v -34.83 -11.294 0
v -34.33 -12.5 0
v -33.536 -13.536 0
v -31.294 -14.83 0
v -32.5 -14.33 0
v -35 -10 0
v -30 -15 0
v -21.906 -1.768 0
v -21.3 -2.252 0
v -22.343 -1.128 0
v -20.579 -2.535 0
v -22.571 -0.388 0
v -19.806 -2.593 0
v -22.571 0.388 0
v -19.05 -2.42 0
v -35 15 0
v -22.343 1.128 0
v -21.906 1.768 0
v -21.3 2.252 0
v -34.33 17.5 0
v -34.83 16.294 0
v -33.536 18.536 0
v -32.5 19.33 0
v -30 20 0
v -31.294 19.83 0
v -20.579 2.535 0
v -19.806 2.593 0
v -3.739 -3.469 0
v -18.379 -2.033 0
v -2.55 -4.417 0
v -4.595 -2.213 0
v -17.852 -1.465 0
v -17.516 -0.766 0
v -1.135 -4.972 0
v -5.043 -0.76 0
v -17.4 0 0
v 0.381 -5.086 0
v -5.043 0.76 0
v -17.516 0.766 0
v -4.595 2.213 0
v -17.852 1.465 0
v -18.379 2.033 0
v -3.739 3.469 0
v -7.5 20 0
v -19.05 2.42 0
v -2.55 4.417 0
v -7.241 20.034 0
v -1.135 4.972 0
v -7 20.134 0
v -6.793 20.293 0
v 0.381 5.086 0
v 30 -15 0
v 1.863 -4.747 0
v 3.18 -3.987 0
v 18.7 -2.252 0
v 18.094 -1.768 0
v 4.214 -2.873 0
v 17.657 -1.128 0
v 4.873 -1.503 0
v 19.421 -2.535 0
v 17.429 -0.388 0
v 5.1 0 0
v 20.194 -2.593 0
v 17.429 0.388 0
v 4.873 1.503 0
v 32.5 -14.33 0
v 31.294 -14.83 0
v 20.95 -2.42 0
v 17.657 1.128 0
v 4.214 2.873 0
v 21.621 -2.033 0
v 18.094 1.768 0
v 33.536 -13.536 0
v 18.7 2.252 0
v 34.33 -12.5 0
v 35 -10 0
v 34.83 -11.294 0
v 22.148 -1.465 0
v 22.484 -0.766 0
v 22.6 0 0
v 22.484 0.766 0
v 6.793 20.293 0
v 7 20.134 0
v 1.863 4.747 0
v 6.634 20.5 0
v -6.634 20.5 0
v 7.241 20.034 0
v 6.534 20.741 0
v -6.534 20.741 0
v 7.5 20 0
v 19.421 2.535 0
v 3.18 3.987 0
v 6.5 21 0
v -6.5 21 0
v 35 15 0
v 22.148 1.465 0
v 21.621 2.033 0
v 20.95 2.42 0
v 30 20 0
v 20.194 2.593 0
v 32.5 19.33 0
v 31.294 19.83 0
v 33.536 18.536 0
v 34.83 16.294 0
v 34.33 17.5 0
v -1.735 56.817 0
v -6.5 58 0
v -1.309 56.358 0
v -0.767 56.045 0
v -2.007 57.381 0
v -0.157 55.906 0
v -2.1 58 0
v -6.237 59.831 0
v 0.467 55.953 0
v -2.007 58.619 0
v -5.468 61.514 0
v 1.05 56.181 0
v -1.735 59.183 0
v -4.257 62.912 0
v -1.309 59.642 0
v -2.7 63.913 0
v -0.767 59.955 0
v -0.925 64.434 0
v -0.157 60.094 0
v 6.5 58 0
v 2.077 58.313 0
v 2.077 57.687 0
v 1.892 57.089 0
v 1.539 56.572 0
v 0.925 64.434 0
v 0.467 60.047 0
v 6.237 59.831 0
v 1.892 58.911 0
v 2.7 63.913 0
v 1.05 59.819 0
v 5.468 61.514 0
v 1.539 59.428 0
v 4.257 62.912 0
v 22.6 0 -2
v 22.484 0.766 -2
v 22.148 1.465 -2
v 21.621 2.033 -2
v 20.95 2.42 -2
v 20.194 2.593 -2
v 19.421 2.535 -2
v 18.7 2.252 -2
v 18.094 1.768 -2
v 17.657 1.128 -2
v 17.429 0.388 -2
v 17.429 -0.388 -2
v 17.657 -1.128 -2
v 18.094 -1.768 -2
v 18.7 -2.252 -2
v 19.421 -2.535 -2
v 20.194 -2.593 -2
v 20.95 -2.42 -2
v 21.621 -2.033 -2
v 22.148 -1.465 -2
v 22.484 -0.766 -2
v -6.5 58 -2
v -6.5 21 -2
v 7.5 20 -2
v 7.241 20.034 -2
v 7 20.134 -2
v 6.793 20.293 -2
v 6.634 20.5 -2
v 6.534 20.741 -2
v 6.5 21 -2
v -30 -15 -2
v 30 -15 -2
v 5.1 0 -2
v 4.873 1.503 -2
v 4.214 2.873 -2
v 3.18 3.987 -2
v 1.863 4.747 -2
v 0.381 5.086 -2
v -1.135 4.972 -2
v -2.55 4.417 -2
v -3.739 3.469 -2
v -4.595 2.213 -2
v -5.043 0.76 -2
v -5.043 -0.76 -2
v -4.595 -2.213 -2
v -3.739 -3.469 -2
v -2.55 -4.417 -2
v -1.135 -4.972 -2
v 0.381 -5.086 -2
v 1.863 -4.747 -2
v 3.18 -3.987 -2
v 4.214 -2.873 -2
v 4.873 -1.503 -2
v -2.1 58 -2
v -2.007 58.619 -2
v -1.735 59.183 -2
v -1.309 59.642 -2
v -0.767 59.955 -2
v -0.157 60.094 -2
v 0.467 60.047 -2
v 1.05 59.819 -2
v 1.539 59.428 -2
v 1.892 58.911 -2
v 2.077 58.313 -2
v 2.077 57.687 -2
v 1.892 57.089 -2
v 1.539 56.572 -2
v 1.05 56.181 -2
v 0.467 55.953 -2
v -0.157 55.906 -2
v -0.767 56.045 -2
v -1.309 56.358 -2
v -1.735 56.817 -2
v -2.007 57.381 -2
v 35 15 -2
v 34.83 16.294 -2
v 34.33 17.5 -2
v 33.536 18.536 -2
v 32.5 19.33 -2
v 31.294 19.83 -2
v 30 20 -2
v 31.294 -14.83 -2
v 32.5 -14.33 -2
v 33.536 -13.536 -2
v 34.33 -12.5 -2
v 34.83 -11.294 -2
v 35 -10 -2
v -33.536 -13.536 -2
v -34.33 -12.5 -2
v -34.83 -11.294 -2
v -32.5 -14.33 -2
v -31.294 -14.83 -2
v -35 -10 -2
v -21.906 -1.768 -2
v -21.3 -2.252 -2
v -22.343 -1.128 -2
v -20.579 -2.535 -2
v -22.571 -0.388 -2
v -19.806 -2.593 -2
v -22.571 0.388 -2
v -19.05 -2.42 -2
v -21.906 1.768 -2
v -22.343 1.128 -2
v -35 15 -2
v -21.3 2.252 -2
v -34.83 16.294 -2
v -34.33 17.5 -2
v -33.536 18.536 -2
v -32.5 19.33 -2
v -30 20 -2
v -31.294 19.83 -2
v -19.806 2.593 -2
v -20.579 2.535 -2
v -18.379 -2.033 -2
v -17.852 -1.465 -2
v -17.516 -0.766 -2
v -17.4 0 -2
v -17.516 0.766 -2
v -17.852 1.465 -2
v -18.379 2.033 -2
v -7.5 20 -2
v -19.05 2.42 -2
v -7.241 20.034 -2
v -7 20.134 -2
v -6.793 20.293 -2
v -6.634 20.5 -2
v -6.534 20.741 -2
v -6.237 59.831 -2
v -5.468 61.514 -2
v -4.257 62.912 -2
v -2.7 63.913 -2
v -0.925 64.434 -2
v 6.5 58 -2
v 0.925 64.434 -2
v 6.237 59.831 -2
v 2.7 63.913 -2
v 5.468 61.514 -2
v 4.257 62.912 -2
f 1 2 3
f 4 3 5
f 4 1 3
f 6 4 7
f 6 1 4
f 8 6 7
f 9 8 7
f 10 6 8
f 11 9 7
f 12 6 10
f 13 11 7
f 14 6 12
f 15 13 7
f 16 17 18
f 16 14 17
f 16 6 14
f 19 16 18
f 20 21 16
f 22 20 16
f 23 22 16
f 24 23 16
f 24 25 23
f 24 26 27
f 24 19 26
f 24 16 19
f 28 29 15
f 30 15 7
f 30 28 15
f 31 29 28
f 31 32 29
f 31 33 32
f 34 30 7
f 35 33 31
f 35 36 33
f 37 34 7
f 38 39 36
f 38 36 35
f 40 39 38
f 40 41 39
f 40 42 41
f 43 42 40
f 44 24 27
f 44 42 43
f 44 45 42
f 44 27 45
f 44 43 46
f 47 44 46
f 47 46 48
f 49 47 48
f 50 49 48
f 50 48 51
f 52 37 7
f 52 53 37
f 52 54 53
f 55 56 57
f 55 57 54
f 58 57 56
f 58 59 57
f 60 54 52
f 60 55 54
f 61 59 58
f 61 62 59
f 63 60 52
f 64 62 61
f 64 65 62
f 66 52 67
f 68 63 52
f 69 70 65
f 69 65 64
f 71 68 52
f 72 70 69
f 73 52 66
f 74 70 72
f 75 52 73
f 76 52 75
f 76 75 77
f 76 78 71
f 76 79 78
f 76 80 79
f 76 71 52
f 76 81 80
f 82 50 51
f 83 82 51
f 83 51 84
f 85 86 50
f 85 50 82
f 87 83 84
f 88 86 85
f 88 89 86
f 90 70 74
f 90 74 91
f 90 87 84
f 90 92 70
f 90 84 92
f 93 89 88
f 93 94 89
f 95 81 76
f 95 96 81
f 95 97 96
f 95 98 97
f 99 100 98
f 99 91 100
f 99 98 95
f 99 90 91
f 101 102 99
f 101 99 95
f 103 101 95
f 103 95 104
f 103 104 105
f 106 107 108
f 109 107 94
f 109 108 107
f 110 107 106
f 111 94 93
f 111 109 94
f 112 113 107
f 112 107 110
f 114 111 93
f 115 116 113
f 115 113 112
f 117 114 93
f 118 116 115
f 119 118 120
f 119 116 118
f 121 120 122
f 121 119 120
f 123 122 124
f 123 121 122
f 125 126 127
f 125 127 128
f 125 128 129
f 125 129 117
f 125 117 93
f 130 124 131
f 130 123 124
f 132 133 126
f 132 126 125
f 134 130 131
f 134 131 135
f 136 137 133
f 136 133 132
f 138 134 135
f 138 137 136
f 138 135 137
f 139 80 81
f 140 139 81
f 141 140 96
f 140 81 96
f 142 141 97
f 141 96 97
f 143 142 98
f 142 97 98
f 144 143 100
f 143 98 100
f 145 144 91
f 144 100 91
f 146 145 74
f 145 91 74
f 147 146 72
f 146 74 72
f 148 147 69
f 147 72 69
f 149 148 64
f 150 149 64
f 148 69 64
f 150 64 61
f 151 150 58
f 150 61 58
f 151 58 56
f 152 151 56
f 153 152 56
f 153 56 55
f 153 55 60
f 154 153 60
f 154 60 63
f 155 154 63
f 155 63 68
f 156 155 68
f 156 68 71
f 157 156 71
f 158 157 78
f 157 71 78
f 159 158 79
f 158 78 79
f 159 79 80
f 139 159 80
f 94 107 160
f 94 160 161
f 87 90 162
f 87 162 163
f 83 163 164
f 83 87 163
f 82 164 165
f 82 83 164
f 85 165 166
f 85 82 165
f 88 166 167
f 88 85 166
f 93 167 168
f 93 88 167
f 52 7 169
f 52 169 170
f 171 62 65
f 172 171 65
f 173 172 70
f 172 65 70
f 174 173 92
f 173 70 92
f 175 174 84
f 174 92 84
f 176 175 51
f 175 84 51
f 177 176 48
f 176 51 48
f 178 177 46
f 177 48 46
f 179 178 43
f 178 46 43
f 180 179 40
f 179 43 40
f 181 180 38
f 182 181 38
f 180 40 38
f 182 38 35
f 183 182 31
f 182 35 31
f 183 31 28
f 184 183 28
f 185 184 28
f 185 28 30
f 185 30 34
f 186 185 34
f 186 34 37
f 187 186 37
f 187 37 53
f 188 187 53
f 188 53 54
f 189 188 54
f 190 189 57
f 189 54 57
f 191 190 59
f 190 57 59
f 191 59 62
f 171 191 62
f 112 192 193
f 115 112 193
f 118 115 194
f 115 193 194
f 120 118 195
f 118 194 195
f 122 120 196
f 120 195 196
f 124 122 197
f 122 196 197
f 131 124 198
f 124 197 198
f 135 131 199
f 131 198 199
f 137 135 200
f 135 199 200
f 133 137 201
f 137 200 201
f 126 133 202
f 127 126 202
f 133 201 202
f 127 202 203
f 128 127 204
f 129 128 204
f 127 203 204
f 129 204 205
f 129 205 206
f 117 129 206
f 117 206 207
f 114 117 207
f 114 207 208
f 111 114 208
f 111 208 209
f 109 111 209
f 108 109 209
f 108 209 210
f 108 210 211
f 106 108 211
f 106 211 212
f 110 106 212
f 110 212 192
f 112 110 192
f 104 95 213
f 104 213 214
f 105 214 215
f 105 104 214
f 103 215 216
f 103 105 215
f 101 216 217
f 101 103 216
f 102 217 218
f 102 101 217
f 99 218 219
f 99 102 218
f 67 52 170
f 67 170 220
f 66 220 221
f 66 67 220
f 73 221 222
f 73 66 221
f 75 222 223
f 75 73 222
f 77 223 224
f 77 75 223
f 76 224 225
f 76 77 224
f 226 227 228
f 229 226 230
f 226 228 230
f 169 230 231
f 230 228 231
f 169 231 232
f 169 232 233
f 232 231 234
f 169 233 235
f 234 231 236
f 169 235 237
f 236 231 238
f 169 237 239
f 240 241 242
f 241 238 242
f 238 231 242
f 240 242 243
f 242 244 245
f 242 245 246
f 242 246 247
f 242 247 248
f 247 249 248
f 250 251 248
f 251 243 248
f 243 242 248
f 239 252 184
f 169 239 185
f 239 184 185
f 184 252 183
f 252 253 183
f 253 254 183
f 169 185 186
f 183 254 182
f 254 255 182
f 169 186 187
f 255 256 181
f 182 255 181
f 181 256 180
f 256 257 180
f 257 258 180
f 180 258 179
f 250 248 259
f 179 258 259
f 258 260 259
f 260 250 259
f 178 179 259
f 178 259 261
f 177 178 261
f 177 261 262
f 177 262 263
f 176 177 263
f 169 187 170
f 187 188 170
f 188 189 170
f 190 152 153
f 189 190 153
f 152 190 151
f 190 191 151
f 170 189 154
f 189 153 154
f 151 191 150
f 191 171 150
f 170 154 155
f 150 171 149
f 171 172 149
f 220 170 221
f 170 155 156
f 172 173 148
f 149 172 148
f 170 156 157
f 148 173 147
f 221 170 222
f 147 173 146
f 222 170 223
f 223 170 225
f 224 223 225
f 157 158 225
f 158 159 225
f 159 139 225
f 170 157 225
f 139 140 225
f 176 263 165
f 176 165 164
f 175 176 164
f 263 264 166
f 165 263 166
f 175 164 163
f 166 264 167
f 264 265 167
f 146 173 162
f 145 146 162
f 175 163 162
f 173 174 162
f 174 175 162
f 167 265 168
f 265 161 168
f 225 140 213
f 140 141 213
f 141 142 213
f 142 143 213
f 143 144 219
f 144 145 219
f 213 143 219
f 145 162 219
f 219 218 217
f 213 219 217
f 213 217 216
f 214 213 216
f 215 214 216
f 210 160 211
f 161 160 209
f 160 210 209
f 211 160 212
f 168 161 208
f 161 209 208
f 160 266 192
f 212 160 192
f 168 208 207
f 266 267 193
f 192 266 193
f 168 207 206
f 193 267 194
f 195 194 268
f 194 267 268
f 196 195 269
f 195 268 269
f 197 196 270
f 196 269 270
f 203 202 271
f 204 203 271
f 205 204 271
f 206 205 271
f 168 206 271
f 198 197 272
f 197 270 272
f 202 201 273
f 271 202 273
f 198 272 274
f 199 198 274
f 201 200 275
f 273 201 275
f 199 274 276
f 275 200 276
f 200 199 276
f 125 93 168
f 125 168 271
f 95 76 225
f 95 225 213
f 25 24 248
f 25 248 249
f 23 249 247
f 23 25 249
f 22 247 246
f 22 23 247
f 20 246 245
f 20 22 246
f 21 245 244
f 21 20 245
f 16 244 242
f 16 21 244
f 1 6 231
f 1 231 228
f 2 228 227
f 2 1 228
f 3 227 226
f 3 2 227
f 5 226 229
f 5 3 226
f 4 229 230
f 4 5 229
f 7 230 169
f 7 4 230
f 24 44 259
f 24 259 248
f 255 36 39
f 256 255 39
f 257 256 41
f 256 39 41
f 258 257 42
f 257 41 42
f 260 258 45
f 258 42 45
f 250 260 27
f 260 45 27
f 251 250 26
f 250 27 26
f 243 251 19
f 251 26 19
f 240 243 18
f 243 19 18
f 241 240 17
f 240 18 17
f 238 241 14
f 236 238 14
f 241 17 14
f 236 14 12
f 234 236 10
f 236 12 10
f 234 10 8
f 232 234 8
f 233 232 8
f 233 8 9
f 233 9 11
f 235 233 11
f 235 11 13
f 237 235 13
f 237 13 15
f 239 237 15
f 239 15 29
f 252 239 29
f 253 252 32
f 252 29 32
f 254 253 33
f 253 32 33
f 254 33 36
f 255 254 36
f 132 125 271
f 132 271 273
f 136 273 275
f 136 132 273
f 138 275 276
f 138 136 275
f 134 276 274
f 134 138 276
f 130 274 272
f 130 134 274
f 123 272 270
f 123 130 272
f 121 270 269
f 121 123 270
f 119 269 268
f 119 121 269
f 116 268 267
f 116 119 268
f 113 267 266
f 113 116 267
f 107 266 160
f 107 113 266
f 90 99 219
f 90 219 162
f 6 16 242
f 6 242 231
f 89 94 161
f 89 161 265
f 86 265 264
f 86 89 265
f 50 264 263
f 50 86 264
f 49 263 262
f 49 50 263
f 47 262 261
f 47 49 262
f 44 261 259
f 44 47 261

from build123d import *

# Parameters (mm, degrees)
SKETCH1_R             = 2.6
SKETCH1_R_2           = 5.1
BASE_FLANGE1_DEPTH    = 2
M5X0_8_TAPPED_HOLE1_D = 4.2


# Sheet-metal steps are written as plain solids
with BuildPart() as part:
    # Sketch1 → Base-Flange1 (new body)
    with BuildSketch(Plane.XY):
        with BuildLine():
            Line((-35, 15), (-35, -10))
            ThreePointArc((-35, -10), (-33.535533906, -13.535533906), (-30, -15))
            Line((-30, -15), (30, -15))
            ThreePointArc((30, -15), (33.535533906, -13.535533906), (35, -10))
            Line((35, -10), (35, 15))
            ThreePointArc((35, 15), (33.535533906, 18.535533906), (30, 20))
            Line((30, 20), (7.5, 20))
            ThreePointArc((7.5, 20), (6.792893219, 20.292893219), (6.5, 21))
            Line((6.5, 21), (6.5, 58))
            ThreePointArc((6.5, 58), (0, 64.5), (-6.5, 58))
            Line((-6.5, 58), (-6.5, 21))
            ThreePointArc((-6.5, 21), (-6.792893219, 20.292893219), (-7.5, 20))
            Line((-7.5, 20), (-30, 20))
            ThreePointArc((-30, 20), (-33.535533906, 18.535533906), (-35, 15))
        make_face()
        with Locations((-20, 0)):
            Circle(SKETCH1_R, mode=Mode.SUBTRACT)
        Circle(SKETCH1_R_2, mode=Mode.SUBTRACT)
        with Locations((20, 0)):
            Circle(SKETCH1_R, mode=Mode.SUBTRACT)
    extrude(amount=-BASE_FLANGE1_DEPTH)

    # M5x0.8 Tapped Hole1 (through all)
    with Locations(Plane.XY):
        with Locations((0, 58)):
            Hole(M5X0_8_TAPPED_HOLE1_D / 2)


solid = part.part
